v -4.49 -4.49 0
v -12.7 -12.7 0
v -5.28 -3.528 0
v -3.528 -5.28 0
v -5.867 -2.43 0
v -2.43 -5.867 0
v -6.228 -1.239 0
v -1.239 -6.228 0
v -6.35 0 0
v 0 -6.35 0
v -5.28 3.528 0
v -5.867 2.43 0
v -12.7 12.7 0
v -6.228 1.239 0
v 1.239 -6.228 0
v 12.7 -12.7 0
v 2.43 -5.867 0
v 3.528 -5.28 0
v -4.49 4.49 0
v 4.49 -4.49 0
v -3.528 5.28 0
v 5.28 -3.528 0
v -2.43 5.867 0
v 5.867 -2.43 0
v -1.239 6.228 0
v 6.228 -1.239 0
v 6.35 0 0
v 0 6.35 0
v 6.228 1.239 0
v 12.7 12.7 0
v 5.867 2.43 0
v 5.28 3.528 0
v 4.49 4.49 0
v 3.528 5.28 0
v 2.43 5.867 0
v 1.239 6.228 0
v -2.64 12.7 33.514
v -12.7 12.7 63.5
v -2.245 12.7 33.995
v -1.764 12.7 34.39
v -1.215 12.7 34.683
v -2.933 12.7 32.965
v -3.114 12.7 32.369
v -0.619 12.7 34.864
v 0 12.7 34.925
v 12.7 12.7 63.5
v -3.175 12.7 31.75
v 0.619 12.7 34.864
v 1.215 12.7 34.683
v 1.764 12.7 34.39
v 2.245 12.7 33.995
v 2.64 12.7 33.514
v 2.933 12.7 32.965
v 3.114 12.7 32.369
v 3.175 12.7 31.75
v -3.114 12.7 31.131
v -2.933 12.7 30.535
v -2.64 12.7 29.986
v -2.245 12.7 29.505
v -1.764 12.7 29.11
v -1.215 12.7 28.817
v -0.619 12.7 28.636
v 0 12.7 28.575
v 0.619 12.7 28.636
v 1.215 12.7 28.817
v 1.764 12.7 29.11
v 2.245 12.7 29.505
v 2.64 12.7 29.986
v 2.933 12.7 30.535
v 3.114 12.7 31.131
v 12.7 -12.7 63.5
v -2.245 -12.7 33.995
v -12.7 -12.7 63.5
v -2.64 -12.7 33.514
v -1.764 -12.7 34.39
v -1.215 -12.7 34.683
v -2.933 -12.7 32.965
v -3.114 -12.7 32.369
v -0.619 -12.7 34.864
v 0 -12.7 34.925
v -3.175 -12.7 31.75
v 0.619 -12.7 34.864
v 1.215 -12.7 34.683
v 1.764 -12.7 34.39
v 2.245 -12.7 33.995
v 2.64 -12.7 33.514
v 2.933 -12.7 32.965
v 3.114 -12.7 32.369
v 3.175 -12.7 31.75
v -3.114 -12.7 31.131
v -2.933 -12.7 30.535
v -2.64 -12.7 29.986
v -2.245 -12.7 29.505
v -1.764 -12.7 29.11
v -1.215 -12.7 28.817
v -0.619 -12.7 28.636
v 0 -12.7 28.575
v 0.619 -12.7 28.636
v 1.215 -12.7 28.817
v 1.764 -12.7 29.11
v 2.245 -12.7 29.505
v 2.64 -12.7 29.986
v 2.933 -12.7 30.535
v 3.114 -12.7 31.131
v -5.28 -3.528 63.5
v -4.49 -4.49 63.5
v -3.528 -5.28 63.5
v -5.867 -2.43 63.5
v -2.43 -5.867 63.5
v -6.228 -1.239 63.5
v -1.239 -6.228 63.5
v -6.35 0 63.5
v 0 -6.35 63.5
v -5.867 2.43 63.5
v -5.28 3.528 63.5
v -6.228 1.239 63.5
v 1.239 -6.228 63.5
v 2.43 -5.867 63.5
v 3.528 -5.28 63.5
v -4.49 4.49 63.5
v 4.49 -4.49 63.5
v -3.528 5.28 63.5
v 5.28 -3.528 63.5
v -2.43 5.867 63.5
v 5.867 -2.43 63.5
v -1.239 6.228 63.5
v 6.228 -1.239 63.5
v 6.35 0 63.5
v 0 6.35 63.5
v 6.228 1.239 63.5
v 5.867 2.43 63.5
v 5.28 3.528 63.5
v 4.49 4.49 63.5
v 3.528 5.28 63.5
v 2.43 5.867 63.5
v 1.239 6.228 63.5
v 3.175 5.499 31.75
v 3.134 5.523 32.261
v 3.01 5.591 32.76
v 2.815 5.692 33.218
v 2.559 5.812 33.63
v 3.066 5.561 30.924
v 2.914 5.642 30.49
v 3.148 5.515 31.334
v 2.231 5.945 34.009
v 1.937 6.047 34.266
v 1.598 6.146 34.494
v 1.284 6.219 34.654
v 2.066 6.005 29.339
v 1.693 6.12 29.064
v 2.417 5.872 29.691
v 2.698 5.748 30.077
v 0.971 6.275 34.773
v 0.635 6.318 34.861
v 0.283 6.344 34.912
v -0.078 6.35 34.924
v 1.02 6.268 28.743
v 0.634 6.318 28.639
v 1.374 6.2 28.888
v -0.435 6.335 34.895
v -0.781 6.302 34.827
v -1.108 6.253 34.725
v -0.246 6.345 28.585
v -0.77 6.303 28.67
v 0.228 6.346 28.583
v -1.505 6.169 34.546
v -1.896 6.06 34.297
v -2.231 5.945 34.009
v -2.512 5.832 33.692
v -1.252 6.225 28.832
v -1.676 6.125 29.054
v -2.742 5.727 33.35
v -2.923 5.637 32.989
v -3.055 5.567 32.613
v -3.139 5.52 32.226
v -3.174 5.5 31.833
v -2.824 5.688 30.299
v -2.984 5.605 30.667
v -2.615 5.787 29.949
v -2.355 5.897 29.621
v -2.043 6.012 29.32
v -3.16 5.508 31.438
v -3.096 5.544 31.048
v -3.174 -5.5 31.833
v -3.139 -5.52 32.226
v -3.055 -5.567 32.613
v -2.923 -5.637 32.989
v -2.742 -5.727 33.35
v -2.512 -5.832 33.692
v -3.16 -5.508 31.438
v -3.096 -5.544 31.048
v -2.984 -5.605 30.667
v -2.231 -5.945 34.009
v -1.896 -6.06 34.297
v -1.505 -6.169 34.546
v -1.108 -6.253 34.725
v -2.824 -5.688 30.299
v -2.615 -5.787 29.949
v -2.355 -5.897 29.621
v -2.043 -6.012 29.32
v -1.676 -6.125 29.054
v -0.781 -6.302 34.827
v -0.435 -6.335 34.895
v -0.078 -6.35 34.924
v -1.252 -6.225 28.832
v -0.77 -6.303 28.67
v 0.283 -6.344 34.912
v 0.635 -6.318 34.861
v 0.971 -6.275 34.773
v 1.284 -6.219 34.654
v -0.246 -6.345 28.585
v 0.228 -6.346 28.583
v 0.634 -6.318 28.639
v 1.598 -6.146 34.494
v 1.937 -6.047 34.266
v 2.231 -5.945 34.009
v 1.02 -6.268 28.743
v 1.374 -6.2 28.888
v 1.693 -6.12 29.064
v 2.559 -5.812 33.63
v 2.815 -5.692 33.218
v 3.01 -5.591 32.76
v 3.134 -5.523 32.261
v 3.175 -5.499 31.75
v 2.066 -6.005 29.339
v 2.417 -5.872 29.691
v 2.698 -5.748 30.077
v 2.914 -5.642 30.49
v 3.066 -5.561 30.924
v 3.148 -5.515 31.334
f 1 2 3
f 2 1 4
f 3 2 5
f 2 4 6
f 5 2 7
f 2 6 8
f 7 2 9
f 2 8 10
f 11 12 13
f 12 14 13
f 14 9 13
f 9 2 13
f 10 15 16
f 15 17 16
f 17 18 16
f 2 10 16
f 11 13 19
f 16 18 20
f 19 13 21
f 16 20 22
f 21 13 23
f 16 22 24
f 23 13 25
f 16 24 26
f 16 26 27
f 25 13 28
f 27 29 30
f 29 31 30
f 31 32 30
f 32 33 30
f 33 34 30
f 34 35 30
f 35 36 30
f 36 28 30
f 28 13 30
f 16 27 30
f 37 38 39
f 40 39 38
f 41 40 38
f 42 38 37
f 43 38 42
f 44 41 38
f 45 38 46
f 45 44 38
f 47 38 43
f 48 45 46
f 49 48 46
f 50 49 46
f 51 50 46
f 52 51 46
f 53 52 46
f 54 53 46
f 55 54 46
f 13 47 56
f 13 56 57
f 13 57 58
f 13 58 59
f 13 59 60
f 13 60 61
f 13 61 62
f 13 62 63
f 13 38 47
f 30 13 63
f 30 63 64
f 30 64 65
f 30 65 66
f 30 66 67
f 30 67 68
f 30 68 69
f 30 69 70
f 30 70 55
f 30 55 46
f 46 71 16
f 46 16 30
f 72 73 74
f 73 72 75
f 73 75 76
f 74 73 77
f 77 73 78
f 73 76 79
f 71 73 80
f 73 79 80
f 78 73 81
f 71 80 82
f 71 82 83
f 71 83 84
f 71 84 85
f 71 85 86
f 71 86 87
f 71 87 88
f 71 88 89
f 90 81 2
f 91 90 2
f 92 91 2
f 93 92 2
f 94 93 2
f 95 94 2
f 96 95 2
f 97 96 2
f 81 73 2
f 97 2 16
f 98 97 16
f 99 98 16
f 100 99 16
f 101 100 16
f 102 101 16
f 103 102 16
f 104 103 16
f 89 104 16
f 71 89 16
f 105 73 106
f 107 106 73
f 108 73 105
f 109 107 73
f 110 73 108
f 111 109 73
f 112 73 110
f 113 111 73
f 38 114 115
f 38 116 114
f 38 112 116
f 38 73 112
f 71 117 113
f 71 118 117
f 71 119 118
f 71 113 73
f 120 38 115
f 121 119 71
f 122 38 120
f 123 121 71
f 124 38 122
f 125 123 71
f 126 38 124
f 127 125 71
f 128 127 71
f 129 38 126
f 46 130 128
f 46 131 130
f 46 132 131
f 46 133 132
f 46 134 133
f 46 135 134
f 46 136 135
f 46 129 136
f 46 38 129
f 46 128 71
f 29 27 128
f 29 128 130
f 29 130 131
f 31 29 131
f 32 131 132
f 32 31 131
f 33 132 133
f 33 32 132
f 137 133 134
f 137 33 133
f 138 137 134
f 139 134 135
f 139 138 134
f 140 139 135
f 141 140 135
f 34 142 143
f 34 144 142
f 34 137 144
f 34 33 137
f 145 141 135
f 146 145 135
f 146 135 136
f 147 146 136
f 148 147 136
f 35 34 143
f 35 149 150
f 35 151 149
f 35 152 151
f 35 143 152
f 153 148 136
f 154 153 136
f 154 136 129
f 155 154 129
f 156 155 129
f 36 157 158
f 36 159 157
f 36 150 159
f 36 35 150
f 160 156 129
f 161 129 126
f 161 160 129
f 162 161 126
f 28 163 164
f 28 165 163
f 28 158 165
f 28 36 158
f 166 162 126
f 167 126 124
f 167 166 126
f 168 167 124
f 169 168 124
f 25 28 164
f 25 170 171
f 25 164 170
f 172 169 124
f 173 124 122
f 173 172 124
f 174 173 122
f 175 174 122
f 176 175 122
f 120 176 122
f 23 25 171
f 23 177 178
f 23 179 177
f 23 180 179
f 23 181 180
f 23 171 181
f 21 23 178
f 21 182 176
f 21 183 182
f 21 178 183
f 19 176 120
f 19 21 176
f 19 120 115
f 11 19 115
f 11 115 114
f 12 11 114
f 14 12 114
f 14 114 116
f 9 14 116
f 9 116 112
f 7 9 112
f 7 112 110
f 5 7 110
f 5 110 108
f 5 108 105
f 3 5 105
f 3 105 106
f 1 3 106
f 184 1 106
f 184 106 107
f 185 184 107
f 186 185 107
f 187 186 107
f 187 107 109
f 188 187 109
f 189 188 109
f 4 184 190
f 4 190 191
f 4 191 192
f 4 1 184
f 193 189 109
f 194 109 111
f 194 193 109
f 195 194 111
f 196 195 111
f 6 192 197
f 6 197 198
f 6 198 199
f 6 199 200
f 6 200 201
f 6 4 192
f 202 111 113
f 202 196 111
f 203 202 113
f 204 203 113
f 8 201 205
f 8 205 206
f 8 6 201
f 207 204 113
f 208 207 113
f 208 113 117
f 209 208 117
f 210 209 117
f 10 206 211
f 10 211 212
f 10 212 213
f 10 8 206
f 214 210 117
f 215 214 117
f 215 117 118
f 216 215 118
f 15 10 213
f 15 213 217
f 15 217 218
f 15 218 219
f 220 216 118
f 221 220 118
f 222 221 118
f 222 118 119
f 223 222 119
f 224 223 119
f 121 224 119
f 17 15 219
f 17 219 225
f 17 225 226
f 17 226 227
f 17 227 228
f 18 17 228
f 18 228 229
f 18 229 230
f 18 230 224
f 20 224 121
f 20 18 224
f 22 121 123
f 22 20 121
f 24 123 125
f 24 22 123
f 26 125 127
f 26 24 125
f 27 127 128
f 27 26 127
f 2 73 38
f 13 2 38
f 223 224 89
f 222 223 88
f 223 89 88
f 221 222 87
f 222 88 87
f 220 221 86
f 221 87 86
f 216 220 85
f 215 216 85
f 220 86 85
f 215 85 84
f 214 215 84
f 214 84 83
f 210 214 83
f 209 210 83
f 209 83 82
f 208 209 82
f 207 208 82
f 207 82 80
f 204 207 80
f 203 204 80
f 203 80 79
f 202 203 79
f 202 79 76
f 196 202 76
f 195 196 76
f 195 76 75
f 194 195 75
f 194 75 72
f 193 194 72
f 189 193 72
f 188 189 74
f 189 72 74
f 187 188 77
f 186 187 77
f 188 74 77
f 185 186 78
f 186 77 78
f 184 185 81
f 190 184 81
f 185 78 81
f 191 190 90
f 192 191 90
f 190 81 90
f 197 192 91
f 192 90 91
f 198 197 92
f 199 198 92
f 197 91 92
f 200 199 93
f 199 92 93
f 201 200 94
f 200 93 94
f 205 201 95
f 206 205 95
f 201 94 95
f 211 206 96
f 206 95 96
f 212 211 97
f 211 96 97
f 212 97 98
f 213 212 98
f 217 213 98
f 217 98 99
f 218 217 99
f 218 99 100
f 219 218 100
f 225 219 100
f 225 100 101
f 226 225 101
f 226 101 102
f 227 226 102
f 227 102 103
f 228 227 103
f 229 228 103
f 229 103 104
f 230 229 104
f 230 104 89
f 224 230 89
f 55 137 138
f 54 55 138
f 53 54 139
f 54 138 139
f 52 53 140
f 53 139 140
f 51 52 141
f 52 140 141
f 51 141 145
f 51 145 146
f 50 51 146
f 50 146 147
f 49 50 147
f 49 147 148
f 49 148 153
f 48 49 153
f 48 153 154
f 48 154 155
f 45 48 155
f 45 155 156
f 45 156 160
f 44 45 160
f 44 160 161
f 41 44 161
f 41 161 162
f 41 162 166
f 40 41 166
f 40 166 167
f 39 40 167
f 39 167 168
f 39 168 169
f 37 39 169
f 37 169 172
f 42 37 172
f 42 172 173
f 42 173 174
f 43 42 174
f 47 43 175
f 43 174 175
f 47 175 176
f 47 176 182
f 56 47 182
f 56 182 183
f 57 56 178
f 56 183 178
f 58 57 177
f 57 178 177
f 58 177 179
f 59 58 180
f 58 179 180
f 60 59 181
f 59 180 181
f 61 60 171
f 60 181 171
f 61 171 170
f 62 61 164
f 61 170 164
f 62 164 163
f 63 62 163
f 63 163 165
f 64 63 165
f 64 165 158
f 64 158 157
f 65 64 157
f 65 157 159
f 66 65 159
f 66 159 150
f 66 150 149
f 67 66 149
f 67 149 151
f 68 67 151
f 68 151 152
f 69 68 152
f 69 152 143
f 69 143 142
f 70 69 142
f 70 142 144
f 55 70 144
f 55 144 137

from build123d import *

# Parameters (mm, degrees)
F0_W     = 25.4
F0_H     = 25.4
F0_R     = 6.35
F1_DEPTH = 63.5
F2_R     = 3.175
F3_DEPTH = 25.401


with BuildPart() as f1:
    # F0 (on Top) → F1 (new body)
    with BuildSketch(Plane.XY):
        Rectangle(F0_W, F0_H)
        Circle(F0_R, mode=Mode.SUBTRACT)
    extrude(amount=F1_DEPTH)

    # F2 (on face) → F3 (cut, through all)
    with BuildSketch(Plane.XZ.offset(12.7)):
        with Locations((0, 31.75)):
            Circle(F2_R)
    extrude(amount=-F3_DEPTH, mode=Mode.SUBTRACT)


solid = f1.part
